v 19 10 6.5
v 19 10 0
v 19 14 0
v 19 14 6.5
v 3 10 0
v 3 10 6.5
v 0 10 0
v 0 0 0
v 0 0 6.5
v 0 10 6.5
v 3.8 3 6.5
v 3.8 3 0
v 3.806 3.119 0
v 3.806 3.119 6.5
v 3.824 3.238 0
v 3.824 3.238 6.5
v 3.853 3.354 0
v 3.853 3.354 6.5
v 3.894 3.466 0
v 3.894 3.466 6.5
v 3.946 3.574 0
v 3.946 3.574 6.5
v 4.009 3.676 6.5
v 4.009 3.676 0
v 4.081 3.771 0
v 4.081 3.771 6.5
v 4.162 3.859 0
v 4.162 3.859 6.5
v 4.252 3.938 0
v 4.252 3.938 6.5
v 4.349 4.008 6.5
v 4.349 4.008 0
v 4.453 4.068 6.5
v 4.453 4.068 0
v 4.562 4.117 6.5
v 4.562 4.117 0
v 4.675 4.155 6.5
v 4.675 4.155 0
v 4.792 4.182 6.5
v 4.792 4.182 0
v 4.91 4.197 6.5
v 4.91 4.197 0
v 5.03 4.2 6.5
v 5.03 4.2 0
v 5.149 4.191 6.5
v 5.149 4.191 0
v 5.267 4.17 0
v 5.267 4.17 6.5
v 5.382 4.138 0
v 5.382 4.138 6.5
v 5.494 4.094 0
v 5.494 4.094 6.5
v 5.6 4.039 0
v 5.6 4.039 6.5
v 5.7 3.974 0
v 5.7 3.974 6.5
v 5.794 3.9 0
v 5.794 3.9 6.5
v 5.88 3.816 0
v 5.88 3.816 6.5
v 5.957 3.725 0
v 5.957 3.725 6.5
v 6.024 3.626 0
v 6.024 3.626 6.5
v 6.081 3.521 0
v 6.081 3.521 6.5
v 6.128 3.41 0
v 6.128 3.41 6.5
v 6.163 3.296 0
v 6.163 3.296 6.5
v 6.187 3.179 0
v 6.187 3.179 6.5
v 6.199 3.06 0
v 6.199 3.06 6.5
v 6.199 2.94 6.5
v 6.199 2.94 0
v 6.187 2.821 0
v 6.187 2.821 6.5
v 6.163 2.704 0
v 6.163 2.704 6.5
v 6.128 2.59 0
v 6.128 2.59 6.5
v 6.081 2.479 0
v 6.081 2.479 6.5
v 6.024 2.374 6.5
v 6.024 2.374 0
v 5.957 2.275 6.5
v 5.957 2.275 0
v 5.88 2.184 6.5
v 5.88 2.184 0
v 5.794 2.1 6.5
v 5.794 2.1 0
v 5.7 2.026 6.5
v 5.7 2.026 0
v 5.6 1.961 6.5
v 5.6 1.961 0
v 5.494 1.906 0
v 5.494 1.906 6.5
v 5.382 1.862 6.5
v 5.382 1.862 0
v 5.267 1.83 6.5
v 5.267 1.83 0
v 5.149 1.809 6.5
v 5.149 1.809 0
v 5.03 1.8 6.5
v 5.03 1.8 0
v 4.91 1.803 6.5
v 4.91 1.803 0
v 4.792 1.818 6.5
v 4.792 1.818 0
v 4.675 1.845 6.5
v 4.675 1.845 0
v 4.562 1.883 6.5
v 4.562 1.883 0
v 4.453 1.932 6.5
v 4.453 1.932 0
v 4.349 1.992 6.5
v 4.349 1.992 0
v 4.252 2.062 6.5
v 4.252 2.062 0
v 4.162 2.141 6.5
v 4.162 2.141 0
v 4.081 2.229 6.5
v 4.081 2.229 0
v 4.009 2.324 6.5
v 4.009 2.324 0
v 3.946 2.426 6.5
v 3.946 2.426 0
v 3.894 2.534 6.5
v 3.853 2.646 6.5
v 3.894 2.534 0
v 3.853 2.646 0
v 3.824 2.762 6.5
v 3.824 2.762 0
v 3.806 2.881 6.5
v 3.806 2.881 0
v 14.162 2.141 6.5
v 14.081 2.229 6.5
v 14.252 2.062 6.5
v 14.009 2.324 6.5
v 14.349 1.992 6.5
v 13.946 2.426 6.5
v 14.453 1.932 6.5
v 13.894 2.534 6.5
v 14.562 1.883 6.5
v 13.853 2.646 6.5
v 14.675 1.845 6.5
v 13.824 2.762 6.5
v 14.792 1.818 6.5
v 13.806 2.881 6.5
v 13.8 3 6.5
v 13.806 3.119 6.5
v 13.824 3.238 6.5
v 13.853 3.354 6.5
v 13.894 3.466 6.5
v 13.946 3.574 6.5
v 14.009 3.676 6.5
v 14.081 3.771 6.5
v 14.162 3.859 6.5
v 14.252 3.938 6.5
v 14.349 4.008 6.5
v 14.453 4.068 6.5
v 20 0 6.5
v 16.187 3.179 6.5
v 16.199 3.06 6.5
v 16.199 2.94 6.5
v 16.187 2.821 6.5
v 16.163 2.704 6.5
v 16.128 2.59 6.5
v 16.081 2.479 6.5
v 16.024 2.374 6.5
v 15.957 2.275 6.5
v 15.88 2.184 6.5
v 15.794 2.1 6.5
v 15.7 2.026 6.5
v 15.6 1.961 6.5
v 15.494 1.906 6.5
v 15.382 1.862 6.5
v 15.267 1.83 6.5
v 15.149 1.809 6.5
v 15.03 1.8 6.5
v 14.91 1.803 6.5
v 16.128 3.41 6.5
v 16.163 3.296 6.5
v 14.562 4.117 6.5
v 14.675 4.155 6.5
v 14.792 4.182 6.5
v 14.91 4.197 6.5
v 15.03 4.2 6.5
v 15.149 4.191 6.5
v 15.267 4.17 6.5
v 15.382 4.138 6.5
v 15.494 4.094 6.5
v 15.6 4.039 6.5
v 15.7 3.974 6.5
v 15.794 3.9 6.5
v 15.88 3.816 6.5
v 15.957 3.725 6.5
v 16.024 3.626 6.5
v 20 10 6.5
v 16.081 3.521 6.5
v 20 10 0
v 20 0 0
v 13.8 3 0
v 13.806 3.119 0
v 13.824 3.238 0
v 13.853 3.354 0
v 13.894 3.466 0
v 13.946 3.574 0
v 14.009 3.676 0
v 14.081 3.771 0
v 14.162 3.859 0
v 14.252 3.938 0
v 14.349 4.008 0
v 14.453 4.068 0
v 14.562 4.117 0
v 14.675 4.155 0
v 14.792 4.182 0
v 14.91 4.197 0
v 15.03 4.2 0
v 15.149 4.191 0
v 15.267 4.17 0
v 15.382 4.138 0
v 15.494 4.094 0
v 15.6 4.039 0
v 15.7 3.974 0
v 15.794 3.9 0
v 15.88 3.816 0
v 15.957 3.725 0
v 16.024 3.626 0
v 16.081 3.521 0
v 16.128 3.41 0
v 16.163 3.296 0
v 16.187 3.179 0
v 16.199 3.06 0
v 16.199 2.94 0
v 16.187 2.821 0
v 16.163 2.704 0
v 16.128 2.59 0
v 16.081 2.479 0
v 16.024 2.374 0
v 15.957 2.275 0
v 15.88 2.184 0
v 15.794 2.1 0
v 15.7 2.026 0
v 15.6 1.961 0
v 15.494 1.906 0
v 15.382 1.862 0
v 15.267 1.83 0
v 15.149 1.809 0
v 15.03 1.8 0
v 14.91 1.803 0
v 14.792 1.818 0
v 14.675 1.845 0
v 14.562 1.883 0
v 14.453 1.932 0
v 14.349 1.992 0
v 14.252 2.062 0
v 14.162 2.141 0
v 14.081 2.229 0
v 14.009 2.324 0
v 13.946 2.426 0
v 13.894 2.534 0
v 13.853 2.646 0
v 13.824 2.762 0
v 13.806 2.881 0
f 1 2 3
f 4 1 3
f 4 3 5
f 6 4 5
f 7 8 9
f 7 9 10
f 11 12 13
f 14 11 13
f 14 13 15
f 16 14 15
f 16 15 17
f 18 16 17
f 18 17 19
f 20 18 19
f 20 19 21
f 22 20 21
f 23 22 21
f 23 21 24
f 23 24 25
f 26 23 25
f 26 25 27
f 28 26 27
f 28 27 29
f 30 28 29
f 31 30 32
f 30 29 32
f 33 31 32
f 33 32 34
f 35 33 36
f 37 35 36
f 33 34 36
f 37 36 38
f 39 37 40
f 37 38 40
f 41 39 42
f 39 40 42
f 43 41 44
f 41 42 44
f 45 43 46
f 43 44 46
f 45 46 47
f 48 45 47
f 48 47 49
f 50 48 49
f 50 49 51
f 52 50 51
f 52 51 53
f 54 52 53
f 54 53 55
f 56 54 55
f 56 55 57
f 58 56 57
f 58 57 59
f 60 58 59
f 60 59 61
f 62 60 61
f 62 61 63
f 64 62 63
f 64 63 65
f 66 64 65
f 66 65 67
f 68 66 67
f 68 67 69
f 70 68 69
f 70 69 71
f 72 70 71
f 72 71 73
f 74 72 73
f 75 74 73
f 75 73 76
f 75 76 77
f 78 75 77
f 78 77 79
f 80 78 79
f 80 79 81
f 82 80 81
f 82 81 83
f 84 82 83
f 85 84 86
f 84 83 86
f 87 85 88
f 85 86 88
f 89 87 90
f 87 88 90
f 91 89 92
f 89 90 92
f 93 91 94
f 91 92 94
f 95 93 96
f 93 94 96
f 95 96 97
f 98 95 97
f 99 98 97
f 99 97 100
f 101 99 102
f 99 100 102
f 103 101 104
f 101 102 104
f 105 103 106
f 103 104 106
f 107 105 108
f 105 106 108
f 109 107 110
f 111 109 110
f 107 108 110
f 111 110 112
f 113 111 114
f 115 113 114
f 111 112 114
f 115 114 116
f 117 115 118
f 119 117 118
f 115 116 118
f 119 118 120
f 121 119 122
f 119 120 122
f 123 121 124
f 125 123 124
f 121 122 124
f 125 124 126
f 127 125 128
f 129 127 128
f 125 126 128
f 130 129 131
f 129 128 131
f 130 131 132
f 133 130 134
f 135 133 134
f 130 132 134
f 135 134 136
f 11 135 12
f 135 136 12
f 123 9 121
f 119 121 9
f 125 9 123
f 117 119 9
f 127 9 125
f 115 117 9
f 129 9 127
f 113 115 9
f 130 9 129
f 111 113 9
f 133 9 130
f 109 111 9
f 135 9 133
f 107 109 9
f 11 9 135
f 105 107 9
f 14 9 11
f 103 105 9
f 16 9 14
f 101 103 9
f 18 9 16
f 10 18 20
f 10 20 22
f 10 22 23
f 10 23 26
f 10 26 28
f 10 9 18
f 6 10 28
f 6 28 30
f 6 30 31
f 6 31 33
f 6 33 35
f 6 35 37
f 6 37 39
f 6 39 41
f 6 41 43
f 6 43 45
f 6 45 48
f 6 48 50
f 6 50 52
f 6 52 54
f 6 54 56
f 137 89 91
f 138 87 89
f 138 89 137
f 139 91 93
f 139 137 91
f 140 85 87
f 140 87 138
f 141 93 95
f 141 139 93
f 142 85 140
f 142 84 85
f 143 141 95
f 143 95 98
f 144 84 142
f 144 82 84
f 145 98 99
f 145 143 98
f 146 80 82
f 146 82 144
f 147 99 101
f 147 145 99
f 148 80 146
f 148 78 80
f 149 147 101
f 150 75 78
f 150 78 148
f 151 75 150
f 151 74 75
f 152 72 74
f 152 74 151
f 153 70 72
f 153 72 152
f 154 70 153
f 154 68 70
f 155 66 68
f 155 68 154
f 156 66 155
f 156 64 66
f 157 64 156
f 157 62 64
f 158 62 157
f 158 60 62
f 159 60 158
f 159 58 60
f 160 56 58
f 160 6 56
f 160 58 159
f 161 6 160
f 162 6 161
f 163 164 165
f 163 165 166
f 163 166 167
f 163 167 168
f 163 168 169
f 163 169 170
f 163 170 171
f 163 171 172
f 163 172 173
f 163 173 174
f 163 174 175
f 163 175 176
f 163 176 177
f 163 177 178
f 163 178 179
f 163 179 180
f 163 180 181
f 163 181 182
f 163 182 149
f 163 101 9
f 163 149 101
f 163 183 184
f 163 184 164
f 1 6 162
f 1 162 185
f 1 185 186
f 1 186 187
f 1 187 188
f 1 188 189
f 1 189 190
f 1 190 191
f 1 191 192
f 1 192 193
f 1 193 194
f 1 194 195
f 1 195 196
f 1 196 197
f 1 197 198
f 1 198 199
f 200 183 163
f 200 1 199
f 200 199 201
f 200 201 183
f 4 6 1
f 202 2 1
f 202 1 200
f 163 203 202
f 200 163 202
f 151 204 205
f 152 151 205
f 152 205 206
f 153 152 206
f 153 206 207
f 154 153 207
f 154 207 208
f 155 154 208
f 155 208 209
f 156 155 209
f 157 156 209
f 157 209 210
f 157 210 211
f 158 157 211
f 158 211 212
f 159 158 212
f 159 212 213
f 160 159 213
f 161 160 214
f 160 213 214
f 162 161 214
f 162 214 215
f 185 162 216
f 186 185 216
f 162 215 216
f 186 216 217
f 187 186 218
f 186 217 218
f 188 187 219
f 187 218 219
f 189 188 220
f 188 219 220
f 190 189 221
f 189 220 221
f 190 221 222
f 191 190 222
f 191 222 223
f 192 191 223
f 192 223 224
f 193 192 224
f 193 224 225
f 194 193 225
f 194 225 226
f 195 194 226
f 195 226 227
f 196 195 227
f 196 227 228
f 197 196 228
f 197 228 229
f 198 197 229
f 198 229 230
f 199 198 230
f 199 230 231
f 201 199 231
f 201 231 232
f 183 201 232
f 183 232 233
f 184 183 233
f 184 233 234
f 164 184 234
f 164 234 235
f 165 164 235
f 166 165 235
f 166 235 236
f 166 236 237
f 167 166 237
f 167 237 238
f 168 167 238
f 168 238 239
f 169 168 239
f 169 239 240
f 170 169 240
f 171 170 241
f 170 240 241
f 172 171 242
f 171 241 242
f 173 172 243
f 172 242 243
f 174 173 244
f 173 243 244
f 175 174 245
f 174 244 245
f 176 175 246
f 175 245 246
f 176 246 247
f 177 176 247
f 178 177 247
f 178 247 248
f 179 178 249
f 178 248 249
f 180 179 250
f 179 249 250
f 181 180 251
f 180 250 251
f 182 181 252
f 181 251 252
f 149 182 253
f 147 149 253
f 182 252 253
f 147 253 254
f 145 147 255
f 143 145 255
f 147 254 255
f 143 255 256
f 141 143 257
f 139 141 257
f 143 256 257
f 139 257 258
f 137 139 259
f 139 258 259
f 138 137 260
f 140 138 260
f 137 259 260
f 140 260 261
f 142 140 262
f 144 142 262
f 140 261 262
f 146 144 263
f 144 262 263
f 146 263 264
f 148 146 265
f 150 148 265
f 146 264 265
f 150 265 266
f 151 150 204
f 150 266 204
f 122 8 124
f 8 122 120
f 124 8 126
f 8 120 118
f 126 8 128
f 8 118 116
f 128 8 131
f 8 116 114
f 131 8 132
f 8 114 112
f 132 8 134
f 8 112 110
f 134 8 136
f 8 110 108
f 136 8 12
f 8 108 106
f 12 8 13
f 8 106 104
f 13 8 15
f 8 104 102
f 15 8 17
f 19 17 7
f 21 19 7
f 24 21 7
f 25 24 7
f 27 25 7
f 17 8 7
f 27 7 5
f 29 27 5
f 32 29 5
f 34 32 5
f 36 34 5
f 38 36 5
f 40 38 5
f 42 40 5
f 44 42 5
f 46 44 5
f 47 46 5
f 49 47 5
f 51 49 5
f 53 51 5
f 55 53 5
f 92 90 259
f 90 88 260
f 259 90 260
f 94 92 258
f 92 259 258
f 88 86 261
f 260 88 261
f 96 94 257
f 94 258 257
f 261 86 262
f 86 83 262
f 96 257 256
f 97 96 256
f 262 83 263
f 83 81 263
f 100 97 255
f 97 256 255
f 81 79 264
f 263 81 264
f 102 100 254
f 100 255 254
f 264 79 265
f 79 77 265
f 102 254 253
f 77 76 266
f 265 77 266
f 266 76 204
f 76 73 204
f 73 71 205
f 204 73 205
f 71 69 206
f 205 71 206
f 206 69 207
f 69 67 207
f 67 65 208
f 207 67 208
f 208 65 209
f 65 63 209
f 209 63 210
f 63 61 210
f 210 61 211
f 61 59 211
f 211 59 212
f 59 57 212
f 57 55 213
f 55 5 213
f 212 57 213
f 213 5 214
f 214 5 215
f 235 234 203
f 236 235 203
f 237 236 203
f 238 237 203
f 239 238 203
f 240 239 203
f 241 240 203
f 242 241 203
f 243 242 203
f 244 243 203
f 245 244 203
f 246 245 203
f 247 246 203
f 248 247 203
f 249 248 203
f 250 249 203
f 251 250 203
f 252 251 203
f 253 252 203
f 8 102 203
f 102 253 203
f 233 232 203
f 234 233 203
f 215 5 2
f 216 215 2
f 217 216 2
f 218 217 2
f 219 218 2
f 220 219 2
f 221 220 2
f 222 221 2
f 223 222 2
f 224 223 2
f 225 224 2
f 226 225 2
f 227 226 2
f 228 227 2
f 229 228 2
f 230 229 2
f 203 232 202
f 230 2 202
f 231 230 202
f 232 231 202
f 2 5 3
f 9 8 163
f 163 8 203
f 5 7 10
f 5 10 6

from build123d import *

# Parameters (mm, degrees)
SKETCH1_W            = 20
SKETCH1_H            = 10
BOSS_EXTRUDE1_DEPTH  = 6.5
M2_CLEARANCE_HOLE1_D = 2.4


with BuildPart() as part:
    # Sketch1 → Boss-Extrude1 (new body)
    with BuildSketch(Plane.XY):
        Polygon((19, 14), (3, 10), (19, 10), align=None)
        with Locations((10, 5)):
            Rectangle(SKETCH1_W, SKETCH1_H)
    extrude(amount=BOSS_EXTRUDE1_DEPTH)

    # M2 Clearance Hole1 (through all)
    with Locations(Plane.XY.offset(6.5)):
        with Locations((5, 3), (15, 3)):
            Hole(M2_CLEARANCE_HOLE1_D / 2)


solid = part.part
